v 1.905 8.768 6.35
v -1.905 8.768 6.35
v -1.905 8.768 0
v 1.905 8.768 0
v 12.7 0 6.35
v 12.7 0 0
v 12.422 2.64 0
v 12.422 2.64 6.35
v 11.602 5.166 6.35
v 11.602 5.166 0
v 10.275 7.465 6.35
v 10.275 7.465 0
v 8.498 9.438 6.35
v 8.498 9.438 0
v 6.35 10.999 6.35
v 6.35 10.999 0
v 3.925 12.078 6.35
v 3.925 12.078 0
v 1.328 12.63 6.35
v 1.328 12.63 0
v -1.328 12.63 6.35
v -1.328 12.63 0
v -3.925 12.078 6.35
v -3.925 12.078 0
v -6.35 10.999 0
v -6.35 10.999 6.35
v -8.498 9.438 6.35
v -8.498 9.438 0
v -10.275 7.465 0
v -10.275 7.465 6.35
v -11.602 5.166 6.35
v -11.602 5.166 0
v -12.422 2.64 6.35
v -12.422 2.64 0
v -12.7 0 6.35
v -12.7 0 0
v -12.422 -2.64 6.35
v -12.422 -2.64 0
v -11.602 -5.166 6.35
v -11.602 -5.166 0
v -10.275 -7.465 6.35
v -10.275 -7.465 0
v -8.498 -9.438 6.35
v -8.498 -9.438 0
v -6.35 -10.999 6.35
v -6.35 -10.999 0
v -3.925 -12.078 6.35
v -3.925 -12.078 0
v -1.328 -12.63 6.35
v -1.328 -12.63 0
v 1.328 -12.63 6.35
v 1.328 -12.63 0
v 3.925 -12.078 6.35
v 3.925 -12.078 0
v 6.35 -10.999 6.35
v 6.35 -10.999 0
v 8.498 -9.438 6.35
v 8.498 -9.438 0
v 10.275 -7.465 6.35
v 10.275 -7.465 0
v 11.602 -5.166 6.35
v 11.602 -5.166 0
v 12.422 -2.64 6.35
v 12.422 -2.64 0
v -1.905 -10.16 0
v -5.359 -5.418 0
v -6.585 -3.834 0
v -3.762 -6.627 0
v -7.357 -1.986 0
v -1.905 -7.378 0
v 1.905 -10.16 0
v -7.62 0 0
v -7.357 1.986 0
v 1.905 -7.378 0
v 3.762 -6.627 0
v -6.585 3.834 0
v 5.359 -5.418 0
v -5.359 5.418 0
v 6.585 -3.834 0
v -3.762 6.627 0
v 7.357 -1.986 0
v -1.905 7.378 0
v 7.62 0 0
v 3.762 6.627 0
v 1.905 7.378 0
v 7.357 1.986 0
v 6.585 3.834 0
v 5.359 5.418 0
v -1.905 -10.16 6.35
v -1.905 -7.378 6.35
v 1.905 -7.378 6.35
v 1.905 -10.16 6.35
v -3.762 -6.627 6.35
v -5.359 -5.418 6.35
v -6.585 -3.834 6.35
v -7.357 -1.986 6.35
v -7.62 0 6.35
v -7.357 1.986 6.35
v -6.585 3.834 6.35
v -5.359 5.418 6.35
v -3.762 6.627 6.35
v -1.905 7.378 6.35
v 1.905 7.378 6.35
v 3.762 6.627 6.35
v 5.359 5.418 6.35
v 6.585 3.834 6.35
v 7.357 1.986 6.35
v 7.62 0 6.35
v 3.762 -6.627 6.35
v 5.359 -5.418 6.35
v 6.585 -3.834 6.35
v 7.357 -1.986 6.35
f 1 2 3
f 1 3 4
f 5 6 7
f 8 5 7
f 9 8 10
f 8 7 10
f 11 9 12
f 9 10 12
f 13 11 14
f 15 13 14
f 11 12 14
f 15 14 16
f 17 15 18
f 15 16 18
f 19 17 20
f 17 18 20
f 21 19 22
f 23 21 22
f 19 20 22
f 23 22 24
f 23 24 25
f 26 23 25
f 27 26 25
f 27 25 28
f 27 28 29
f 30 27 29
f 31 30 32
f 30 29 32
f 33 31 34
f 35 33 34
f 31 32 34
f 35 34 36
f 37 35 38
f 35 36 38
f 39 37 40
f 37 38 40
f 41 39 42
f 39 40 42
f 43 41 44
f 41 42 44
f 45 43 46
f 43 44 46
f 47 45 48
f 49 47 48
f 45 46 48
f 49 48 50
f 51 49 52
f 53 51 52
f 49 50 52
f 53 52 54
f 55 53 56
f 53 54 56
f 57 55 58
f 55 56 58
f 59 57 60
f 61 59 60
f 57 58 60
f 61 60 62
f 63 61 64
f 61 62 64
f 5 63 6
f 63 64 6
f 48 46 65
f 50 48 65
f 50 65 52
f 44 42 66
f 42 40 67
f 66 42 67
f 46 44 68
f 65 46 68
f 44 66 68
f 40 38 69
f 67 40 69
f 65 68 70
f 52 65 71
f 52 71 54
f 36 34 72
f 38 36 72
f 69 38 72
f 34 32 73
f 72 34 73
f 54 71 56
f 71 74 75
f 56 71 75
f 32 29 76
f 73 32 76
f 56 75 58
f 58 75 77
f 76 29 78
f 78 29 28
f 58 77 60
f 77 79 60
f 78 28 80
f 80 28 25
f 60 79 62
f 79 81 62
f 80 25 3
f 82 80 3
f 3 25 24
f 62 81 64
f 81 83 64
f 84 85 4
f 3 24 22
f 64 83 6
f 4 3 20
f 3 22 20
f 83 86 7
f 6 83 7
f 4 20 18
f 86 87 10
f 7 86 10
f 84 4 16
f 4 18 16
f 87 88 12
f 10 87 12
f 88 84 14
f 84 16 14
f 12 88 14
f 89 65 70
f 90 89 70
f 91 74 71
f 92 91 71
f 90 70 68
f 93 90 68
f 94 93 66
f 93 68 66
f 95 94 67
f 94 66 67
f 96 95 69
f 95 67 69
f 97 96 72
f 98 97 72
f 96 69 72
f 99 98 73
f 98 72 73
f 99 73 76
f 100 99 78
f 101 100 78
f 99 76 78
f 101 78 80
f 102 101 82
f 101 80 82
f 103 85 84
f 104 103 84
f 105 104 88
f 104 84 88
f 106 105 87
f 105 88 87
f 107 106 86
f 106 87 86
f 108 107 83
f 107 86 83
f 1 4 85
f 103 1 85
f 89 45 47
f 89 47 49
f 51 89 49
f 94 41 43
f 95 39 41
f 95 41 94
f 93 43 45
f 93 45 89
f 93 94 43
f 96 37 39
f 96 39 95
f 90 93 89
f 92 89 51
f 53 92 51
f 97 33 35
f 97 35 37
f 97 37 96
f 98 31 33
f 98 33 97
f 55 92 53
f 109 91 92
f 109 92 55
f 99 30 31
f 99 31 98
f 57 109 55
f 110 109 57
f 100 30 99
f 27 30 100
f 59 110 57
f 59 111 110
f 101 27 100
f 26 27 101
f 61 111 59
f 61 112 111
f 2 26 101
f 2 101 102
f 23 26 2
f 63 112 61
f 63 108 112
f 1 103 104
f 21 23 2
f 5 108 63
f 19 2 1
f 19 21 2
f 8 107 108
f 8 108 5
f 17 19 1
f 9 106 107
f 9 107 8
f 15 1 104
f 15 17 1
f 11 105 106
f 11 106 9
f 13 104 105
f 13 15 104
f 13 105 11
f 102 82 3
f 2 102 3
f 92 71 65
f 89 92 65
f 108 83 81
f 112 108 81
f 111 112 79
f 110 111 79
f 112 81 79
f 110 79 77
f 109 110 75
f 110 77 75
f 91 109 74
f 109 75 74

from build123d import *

# Parameters (mm, degrees)
F0_R     = 12.7
F1_DEPTH = 6.35
F2_W     = 3.81
F2_H     = 1.39192
F3_DEPTH = 6.35


with BuildPart() as f1:
    # F0 (on Top) → F1 (new body)
    with BuildSketch(Plane.XY):
        Circle(F0_R)
        with BuildLine():
            ThreePointArc((1.905, 7.378033), (6.024139, 4.666278), (7.62, 0))
            ThreePointArc((7.62, 0), (6.024139, -4.666278), (1.905, -7.378033))
            Line((1.905, -7.378033), (1.905, -10.16))
            Line((1.905, -10.16), (-1.905, -10.16))
            Line((-1.905, -10.16), (-1.905, -7.378033))
            ThreePointArc((-1.905, -7.378033), (-7.62, 0), (-1.905, 7.378033))
            Line((-1.905, 7.378033), (-1.905, 10.16))
            Line((-1.905, 10.16), (1.905, 10.16))
            Line((1.905, 10.16), (1.905, 7.378033))
        make_face(mode=Mode.SUBTRACT)
    extrude(amount=F1_DEPTH)

    # F2 (on face) → F3 (join)
    with BuildSketch(Plane.XY.offset(6.35)):
        with Locations((0, 9.46404)):
            Rectangle(F2_W, F2_H)
    extrude(amount=-F3_DEPTH)


solid = f1.part
